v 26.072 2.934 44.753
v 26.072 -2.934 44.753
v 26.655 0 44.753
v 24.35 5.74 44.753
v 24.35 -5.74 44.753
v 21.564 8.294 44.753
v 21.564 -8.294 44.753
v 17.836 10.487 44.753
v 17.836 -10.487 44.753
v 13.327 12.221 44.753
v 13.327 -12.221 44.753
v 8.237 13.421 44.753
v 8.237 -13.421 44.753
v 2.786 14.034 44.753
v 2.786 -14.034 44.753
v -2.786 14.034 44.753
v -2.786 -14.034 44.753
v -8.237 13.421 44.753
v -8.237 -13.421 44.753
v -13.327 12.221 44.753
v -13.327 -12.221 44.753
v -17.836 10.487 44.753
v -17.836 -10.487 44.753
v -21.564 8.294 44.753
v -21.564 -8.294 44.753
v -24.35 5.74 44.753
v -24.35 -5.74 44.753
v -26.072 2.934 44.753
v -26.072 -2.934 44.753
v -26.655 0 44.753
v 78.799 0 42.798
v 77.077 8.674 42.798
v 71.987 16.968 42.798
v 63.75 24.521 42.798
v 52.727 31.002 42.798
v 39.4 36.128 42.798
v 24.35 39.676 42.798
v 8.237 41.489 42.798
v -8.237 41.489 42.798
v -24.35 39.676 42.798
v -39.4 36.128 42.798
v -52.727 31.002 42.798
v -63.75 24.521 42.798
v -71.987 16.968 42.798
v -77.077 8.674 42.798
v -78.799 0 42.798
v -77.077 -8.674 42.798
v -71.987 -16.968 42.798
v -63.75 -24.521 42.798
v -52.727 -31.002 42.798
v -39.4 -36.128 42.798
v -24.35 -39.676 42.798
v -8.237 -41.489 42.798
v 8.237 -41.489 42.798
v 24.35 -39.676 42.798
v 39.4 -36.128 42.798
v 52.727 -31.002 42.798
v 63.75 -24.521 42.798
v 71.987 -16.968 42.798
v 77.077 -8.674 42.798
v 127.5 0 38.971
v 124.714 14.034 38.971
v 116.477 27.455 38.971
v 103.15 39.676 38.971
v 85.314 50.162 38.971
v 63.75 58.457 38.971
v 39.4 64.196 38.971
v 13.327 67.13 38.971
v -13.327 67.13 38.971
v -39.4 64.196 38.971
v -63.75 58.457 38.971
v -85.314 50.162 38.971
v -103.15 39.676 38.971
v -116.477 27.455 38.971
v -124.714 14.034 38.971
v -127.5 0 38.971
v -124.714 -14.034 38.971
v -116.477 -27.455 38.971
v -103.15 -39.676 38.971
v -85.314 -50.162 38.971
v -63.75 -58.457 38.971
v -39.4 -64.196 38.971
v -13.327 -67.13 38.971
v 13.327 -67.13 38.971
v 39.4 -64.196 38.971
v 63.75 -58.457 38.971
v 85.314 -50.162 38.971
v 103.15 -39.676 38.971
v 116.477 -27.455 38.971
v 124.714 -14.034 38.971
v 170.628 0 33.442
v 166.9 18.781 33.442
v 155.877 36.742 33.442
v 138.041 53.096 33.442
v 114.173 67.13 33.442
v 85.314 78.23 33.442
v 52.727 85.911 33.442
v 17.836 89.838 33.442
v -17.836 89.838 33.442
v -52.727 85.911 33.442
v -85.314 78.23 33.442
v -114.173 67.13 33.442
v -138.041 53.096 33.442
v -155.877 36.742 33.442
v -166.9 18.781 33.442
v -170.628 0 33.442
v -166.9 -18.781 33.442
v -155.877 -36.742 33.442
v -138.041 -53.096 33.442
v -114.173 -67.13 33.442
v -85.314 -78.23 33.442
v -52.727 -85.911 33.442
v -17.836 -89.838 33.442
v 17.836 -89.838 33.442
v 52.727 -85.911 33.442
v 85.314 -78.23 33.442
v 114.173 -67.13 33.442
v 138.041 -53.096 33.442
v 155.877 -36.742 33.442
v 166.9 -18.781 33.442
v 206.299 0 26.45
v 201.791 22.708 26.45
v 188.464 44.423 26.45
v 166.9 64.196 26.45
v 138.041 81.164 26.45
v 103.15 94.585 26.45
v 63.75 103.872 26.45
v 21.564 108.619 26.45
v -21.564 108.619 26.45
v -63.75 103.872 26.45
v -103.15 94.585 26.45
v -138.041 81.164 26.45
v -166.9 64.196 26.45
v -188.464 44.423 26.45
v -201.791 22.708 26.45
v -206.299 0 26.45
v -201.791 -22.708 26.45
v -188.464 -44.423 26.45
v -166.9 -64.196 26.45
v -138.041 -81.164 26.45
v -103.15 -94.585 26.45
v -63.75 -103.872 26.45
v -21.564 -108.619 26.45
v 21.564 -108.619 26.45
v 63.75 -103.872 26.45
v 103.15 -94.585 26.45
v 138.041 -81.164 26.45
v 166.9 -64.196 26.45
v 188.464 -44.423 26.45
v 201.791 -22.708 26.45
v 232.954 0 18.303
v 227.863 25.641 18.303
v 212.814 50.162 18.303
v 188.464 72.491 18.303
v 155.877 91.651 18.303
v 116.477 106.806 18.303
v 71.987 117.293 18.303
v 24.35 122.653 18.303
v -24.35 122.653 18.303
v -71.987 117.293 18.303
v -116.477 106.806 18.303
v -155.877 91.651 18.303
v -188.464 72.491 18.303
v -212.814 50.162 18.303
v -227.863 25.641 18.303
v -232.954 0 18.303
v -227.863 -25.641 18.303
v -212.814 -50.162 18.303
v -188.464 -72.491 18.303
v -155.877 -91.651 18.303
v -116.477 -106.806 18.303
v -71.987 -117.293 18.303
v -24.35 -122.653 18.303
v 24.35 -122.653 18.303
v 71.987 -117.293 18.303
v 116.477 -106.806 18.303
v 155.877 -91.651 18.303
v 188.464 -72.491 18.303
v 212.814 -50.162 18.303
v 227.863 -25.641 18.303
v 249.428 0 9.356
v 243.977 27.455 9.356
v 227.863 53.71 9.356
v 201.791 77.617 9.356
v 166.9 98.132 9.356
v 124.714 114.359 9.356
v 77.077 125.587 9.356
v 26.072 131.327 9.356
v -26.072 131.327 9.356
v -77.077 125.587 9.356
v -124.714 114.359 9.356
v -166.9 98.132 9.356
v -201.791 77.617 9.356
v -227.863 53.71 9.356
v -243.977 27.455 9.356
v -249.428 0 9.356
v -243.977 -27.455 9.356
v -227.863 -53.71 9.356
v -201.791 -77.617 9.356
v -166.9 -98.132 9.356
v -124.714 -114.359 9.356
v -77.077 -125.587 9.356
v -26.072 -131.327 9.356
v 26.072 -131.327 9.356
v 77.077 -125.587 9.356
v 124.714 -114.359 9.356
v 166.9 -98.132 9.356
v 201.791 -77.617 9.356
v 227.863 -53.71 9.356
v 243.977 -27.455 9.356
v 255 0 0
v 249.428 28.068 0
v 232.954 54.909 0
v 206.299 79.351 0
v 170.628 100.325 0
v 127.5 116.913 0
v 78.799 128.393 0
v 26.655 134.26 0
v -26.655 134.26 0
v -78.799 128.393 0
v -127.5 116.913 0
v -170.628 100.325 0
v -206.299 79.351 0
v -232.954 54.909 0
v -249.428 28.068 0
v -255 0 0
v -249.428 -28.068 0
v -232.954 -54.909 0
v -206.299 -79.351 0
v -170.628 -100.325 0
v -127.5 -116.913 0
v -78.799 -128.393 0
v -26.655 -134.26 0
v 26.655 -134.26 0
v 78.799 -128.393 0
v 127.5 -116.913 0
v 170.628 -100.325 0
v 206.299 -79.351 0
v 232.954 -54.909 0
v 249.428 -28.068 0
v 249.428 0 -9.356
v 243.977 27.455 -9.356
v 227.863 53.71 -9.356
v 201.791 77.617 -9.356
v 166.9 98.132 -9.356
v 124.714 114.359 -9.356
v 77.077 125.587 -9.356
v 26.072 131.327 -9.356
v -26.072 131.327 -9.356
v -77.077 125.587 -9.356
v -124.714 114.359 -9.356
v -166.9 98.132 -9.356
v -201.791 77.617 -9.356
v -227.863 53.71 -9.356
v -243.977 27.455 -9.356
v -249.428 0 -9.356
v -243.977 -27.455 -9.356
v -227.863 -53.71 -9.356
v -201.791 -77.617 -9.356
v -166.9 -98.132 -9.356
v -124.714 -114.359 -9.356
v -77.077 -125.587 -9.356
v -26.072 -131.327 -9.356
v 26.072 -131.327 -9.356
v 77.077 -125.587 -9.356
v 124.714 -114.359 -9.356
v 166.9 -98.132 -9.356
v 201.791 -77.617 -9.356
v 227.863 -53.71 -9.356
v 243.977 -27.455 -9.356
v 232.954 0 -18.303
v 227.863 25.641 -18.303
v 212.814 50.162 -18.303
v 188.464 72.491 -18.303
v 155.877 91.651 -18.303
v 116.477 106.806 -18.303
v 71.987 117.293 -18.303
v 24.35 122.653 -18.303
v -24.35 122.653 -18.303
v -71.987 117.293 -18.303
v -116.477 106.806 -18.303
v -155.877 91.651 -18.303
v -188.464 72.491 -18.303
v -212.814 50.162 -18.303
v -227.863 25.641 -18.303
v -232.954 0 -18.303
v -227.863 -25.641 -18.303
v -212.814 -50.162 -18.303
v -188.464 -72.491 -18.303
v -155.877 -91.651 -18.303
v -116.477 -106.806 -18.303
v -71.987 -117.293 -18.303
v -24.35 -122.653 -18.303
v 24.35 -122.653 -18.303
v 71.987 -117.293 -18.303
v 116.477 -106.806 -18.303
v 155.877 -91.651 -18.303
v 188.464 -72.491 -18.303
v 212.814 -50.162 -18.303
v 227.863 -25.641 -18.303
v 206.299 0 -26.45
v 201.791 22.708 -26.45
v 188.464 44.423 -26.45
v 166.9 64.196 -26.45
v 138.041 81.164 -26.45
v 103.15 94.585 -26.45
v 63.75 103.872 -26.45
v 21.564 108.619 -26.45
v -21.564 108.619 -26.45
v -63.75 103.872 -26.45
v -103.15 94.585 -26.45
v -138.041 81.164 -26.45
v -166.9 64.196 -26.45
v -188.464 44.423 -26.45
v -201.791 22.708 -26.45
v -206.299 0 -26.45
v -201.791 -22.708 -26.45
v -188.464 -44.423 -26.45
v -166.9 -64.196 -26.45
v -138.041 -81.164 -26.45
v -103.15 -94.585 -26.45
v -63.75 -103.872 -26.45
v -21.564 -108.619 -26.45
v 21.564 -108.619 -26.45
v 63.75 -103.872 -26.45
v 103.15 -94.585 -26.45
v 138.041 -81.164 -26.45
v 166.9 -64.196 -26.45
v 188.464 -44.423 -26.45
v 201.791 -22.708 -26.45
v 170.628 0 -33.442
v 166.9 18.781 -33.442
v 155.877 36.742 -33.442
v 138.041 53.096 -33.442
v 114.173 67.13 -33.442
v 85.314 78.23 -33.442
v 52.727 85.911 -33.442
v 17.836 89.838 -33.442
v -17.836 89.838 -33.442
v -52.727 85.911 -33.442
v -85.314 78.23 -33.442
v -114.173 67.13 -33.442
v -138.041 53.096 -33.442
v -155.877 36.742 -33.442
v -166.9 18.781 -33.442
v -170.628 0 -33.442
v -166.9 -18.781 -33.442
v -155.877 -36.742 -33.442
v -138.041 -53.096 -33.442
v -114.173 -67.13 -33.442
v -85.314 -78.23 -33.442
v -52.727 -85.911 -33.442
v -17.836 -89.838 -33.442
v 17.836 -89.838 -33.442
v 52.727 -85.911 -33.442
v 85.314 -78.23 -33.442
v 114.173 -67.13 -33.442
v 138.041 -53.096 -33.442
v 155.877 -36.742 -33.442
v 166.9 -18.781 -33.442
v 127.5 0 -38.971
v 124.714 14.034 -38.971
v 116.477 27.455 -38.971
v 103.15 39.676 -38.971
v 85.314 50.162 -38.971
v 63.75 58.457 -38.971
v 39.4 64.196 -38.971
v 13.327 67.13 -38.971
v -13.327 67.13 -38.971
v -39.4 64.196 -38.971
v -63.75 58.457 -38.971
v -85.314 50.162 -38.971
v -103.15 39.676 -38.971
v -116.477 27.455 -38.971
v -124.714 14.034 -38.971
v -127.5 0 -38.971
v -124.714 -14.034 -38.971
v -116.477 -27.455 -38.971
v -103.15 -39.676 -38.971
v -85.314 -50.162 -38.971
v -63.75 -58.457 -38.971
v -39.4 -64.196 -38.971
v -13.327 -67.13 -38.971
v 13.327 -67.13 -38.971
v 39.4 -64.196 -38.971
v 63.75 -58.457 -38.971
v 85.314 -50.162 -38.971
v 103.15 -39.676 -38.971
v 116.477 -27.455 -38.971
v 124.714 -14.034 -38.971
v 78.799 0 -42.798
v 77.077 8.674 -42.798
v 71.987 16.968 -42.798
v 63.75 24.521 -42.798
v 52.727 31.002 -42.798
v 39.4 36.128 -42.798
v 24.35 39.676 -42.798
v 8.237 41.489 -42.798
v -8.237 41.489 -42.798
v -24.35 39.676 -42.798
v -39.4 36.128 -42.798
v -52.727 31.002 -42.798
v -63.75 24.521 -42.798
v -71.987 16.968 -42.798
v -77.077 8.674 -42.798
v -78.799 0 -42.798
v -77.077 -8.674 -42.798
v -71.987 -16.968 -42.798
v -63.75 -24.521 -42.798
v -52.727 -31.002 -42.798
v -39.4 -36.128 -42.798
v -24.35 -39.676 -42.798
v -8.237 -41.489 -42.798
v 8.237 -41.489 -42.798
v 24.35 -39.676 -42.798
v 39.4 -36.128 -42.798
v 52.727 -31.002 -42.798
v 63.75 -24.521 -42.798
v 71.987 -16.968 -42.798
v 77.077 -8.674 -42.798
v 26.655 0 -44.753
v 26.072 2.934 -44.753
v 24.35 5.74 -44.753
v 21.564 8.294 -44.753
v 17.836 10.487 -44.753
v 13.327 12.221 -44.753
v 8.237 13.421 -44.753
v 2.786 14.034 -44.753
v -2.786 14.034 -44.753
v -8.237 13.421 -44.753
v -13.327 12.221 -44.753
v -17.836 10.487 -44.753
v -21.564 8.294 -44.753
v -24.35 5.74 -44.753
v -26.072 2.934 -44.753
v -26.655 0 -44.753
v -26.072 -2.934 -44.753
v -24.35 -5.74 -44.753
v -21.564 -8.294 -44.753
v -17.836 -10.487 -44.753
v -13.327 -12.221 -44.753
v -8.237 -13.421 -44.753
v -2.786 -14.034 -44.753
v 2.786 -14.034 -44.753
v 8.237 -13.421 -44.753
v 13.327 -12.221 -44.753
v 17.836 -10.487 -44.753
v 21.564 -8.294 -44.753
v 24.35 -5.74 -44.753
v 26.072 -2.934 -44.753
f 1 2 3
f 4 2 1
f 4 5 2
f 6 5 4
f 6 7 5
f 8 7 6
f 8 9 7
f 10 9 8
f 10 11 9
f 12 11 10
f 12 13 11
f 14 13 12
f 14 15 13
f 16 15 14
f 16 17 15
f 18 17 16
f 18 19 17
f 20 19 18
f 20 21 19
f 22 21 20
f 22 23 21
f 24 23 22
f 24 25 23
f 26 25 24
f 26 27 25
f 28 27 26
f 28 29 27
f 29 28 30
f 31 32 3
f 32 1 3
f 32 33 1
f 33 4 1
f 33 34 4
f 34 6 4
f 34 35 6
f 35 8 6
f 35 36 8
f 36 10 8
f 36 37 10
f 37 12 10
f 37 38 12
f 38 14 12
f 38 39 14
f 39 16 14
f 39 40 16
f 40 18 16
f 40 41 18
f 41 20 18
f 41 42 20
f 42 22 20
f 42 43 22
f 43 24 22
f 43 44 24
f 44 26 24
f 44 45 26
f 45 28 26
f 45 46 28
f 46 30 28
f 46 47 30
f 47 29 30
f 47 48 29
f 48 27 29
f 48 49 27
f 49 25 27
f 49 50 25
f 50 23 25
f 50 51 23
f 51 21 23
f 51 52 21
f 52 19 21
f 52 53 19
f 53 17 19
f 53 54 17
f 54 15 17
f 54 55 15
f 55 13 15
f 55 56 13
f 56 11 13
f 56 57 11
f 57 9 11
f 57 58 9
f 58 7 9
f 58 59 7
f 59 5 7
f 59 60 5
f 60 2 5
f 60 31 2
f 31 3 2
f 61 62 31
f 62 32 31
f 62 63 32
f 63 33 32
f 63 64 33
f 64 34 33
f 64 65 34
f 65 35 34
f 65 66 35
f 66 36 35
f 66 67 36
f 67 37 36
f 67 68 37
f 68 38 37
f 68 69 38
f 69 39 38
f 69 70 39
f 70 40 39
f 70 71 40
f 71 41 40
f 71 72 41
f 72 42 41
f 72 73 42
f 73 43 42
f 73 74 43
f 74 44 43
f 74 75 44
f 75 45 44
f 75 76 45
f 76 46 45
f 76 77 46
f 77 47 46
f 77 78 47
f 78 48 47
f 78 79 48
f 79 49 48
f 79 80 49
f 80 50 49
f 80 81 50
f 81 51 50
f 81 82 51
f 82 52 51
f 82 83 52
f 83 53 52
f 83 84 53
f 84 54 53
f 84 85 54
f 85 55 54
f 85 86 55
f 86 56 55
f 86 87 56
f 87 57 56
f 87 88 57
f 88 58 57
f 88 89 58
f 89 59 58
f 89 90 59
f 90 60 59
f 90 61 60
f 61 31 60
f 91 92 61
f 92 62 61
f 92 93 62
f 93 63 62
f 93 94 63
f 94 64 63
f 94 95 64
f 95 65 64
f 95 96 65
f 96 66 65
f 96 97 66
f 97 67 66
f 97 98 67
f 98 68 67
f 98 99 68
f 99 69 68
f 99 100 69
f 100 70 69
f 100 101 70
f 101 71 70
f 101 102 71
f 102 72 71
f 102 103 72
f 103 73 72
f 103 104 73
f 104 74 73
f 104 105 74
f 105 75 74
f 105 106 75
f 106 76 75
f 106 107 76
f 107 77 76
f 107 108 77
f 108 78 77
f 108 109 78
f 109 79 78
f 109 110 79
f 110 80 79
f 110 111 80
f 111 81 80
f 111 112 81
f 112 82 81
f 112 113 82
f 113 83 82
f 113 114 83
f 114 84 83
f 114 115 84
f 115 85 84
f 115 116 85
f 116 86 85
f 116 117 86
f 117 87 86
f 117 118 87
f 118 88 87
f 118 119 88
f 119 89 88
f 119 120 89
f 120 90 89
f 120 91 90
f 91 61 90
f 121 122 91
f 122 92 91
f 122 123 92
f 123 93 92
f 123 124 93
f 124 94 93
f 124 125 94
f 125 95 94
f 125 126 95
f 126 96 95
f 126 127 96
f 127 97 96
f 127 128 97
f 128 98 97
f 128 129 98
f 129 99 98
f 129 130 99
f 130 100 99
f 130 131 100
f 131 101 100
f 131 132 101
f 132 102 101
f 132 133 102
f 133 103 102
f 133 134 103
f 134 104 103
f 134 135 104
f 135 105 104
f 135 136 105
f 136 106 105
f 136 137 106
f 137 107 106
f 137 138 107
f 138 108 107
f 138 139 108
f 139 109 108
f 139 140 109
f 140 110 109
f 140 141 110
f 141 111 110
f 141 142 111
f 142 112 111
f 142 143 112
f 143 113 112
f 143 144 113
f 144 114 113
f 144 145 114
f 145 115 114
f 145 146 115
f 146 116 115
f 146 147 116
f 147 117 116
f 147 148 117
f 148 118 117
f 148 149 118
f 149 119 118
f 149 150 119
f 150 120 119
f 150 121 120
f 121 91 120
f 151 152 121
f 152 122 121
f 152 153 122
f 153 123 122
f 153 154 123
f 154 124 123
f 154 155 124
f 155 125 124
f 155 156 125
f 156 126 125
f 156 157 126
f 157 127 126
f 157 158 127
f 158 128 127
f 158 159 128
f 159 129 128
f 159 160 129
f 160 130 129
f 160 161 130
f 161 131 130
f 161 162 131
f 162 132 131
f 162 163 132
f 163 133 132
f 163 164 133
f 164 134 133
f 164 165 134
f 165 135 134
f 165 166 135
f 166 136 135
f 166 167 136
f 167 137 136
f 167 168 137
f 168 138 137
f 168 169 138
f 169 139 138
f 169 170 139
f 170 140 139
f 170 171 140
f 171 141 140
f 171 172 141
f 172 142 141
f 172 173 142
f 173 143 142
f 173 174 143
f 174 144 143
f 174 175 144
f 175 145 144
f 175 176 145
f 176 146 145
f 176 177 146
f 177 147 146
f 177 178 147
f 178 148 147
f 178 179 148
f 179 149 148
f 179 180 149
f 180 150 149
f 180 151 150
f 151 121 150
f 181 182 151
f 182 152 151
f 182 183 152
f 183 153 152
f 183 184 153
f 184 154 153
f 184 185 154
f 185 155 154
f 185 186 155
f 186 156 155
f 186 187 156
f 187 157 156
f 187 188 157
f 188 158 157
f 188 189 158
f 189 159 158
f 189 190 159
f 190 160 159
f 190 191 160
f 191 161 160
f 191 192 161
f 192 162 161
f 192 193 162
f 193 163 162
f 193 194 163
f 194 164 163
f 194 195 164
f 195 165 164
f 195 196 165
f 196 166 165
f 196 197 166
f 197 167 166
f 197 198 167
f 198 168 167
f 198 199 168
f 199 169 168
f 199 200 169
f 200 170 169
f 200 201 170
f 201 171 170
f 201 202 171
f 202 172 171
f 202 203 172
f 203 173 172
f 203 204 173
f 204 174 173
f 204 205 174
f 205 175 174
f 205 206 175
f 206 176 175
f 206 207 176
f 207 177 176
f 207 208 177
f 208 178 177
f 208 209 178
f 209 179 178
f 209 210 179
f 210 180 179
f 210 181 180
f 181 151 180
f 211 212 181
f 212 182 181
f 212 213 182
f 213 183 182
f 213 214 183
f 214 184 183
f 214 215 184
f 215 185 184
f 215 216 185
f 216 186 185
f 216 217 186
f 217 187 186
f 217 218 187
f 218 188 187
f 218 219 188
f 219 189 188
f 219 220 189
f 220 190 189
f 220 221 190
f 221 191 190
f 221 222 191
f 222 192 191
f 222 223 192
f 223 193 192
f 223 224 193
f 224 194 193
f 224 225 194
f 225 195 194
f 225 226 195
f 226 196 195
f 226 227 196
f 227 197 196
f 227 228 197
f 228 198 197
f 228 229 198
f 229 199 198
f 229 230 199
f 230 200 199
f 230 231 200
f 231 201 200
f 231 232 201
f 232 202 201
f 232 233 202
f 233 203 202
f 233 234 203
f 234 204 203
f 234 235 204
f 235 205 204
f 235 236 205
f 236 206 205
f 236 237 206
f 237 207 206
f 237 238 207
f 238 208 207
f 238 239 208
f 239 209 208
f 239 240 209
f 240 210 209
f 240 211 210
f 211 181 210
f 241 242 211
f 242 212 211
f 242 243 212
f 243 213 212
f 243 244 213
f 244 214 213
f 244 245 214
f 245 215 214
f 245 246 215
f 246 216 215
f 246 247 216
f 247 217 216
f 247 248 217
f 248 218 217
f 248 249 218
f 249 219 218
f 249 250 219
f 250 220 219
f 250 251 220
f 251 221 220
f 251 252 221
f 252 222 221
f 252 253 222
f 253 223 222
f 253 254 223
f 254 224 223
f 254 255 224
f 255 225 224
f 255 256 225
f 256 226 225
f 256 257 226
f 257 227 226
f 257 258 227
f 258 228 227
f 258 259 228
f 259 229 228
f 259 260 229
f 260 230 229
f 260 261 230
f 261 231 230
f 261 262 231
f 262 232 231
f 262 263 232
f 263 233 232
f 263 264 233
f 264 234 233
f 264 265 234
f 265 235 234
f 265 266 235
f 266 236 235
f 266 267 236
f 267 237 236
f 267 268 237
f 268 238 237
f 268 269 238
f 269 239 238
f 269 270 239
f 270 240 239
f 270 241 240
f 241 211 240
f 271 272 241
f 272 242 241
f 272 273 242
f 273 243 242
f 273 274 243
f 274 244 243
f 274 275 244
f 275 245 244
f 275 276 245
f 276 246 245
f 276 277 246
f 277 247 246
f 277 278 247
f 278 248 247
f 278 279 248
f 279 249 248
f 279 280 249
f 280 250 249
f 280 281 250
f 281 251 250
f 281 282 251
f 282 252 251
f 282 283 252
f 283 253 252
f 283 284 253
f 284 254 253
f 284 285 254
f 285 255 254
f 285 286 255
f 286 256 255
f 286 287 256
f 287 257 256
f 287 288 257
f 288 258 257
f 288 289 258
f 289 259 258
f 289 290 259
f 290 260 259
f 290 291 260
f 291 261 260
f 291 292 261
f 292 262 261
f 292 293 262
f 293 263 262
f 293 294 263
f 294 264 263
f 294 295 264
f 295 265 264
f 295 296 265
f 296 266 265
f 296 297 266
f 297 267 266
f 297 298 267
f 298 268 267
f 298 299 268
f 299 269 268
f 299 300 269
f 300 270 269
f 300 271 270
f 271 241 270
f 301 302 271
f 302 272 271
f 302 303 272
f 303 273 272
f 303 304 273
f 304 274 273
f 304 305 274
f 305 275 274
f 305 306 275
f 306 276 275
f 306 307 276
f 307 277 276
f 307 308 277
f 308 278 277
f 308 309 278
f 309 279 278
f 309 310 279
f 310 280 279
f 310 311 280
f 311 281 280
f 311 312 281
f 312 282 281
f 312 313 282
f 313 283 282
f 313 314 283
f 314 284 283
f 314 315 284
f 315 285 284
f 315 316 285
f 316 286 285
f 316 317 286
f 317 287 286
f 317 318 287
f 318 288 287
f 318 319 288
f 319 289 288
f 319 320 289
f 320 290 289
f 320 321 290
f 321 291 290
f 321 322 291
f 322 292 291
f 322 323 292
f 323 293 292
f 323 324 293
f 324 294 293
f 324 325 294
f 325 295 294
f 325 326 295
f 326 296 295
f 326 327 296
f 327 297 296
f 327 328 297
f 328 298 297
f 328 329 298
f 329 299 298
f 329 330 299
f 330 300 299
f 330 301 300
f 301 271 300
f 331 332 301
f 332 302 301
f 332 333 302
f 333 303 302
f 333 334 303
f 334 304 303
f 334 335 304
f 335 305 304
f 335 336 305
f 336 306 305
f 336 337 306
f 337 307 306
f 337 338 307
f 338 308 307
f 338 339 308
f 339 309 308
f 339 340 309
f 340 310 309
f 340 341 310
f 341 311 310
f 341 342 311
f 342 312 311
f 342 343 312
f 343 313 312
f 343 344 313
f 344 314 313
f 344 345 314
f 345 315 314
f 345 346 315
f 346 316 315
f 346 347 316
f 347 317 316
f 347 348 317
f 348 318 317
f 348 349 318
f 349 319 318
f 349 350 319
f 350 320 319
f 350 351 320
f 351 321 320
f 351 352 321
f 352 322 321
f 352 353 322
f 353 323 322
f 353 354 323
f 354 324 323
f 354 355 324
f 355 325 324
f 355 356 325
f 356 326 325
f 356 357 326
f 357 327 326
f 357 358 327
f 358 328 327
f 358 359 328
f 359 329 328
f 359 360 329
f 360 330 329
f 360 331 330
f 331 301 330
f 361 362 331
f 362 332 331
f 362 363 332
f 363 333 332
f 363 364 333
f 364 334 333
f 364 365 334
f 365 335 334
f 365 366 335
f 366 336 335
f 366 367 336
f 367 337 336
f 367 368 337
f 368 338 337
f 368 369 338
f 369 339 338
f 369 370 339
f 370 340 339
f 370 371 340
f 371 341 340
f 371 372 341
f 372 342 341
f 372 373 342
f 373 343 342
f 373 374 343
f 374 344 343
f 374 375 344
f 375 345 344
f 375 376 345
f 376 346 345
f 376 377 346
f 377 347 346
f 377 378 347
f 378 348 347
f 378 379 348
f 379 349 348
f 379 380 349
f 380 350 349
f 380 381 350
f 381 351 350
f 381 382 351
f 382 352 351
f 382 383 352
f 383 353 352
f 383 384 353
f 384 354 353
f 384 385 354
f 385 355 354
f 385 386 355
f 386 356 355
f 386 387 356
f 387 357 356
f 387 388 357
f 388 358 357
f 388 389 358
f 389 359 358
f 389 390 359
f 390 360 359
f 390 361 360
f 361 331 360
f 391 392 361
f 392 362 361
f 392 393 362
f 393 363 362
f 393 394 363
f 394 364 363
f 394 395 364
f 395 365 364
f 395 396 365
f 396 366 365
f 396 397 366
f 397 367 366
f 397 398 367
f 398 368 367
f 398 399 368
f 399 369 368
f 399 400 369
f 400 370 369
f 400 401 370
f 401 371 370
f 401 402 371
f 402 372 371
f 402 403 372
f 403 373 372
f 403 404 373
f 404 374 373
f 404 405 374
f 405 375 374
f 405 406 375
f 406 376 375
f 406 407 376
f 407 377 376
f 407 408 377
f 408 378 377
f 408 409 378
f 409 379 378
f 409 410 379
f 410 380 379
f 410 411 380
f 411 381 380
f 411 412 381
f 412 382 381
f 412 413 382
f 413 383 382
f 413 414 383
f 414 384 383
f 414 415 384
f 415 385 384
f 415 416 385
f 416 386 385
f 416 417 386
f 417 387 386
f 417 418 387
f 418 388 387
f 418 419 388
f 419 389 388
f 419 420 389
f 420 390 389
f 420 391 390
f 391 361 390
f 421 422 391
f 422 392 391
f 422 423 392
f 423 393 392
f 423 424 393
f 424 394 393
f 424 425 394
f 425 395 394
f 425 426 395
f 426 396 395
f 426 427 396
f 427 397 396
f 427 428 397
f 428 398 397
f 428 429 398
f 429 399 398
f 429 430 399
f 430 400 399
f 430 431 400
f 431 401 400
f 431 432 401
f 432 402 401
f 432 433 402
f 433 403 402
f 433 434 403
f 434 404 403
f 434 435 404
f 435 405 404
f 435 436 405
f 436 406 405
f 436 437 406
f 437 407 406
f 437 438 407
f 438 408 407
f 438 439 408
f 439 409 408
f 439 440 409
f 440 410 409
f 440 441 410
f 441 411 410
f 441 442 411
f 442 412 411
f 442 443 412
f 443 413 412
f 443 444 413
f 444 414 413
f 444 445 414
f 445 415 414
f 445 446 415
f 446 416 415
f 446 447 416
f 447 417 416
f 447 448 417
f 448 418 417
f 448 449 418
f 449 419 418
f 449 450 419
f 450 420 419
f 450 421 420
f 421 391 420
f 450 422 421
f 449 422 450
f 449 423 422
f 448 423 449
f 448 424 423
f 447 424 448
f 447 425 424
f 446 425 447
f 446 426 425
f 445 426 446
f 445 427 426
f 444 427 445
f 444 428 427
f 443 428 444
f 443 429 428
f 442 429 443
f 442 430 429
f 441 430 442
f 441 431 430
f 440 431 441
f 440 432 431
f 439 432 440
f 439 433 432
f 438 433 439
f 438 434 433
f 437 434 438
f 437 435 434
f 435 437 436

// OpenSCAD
// Generated by SolidPython 1.0.1 on 2020-07-29 00:46:53


scale(v = [17, 9, 3]) {
	sphere(r = 15);
}
/***********************************************
*********      SolidPython code:      **********
************************************************
 
# import packages: SolidPython
from solid import *
from solid.utils import *
from itertools import chain, combinations, permutations


class Resize:

    def __init__(self, scad_file):
        self.scad_file = scad_file
        #self.scad_file = import_scad(scad_file)
        # cone/cylinder param:
        self.r1 = 0
        self.r2 = 0
        self.h = 0
        # rectangular prism param:
        self.w = 0
        self.l = 0
        # ellipse param:
        self.r = 0

    # import OpenScad code (file name corresponds to shape)


    # classify shape + parameters
    def assign(self, param1, param2, param3):
        if self.scad_file == 'cone.scad':
            self.r1 = param1
            self.r2 = param2
            self.h = param3
        elif self.scad_file == 'cylinder.scad':
            self.r1 = param1
            self.r2 = param2
            self.h = param3
        elif self.scad_file == 'rectangularPrism.scad':
            self.h = param1
            self.l = param2
            self.w = param3
        else:
            self.r = param1
            self.h = param2

    # resize parameters
    def iterate(self):
        x = range(3, 20, 2)
        i = 1
        if self.scad_file == 'cone.scad':
            tempList = list(permutations(x, 2))
            for temp in tempList:
                param1 = temp[0]
                param2 = temp[1]
                filepath = 'produced_scad_files/' + 'cone' + str(param1) + '_' + str(param2) + '_' + '.scad'
                scad_render_to_file(cylinder(h=param1, r1=param2, r2=0), filepath)

        elif self.scad_file == 'cylinder.scad':
            tempList = list(permutations(x, 3))
            for temp in tempList:
                param1 = temp[0]
                param2 = temp[1]
                filepath = 'produced_scad_files/' + 'cylinder' + str(param1) + '_' + str(param2) + '_' + '.scad'
                scad_render_to_file(cylinder(h=param1, r1=param2, r2=param2), filepath)

        elif self.scad_file == 'rectangularPrism.scad':
            tempList = list(permutations(x, 3))
            for temp in tempList:
                param1 = temp[0]
                param2 = temp[1]
                param3 = temp[2]
                filepath = 'produced_scad_files/' + 'rectangularPrism' + str(param1) + '_' + str(param2) + '_' + str(
                    param3) + '.scad'
                scad_render_to_file(cube(size=(param1, param2, param3)), filepath)

        elif self.scad_file == 'ellipse.scad':
            tempList = list(permutations(x, 4))
            for temp in tempList:
                param1 = temp[0]
                param2 = temp[1]
                param3 = temp[2]
                param4 = temp[3]
                filepath = 'produced_scad_files/' + 'ellipse' + str(param1) + '_' + str(param2) + '_' + str(param3) + '_' + str(param4) + '.scad'
                scad_render_to_file(scale([param1, param2, param3])(sphere(r=param4)), filepath)

    def render_to_scadfile(self):
        scad_render_to_file(scad, 'example.scad') 
 
************************************************/
